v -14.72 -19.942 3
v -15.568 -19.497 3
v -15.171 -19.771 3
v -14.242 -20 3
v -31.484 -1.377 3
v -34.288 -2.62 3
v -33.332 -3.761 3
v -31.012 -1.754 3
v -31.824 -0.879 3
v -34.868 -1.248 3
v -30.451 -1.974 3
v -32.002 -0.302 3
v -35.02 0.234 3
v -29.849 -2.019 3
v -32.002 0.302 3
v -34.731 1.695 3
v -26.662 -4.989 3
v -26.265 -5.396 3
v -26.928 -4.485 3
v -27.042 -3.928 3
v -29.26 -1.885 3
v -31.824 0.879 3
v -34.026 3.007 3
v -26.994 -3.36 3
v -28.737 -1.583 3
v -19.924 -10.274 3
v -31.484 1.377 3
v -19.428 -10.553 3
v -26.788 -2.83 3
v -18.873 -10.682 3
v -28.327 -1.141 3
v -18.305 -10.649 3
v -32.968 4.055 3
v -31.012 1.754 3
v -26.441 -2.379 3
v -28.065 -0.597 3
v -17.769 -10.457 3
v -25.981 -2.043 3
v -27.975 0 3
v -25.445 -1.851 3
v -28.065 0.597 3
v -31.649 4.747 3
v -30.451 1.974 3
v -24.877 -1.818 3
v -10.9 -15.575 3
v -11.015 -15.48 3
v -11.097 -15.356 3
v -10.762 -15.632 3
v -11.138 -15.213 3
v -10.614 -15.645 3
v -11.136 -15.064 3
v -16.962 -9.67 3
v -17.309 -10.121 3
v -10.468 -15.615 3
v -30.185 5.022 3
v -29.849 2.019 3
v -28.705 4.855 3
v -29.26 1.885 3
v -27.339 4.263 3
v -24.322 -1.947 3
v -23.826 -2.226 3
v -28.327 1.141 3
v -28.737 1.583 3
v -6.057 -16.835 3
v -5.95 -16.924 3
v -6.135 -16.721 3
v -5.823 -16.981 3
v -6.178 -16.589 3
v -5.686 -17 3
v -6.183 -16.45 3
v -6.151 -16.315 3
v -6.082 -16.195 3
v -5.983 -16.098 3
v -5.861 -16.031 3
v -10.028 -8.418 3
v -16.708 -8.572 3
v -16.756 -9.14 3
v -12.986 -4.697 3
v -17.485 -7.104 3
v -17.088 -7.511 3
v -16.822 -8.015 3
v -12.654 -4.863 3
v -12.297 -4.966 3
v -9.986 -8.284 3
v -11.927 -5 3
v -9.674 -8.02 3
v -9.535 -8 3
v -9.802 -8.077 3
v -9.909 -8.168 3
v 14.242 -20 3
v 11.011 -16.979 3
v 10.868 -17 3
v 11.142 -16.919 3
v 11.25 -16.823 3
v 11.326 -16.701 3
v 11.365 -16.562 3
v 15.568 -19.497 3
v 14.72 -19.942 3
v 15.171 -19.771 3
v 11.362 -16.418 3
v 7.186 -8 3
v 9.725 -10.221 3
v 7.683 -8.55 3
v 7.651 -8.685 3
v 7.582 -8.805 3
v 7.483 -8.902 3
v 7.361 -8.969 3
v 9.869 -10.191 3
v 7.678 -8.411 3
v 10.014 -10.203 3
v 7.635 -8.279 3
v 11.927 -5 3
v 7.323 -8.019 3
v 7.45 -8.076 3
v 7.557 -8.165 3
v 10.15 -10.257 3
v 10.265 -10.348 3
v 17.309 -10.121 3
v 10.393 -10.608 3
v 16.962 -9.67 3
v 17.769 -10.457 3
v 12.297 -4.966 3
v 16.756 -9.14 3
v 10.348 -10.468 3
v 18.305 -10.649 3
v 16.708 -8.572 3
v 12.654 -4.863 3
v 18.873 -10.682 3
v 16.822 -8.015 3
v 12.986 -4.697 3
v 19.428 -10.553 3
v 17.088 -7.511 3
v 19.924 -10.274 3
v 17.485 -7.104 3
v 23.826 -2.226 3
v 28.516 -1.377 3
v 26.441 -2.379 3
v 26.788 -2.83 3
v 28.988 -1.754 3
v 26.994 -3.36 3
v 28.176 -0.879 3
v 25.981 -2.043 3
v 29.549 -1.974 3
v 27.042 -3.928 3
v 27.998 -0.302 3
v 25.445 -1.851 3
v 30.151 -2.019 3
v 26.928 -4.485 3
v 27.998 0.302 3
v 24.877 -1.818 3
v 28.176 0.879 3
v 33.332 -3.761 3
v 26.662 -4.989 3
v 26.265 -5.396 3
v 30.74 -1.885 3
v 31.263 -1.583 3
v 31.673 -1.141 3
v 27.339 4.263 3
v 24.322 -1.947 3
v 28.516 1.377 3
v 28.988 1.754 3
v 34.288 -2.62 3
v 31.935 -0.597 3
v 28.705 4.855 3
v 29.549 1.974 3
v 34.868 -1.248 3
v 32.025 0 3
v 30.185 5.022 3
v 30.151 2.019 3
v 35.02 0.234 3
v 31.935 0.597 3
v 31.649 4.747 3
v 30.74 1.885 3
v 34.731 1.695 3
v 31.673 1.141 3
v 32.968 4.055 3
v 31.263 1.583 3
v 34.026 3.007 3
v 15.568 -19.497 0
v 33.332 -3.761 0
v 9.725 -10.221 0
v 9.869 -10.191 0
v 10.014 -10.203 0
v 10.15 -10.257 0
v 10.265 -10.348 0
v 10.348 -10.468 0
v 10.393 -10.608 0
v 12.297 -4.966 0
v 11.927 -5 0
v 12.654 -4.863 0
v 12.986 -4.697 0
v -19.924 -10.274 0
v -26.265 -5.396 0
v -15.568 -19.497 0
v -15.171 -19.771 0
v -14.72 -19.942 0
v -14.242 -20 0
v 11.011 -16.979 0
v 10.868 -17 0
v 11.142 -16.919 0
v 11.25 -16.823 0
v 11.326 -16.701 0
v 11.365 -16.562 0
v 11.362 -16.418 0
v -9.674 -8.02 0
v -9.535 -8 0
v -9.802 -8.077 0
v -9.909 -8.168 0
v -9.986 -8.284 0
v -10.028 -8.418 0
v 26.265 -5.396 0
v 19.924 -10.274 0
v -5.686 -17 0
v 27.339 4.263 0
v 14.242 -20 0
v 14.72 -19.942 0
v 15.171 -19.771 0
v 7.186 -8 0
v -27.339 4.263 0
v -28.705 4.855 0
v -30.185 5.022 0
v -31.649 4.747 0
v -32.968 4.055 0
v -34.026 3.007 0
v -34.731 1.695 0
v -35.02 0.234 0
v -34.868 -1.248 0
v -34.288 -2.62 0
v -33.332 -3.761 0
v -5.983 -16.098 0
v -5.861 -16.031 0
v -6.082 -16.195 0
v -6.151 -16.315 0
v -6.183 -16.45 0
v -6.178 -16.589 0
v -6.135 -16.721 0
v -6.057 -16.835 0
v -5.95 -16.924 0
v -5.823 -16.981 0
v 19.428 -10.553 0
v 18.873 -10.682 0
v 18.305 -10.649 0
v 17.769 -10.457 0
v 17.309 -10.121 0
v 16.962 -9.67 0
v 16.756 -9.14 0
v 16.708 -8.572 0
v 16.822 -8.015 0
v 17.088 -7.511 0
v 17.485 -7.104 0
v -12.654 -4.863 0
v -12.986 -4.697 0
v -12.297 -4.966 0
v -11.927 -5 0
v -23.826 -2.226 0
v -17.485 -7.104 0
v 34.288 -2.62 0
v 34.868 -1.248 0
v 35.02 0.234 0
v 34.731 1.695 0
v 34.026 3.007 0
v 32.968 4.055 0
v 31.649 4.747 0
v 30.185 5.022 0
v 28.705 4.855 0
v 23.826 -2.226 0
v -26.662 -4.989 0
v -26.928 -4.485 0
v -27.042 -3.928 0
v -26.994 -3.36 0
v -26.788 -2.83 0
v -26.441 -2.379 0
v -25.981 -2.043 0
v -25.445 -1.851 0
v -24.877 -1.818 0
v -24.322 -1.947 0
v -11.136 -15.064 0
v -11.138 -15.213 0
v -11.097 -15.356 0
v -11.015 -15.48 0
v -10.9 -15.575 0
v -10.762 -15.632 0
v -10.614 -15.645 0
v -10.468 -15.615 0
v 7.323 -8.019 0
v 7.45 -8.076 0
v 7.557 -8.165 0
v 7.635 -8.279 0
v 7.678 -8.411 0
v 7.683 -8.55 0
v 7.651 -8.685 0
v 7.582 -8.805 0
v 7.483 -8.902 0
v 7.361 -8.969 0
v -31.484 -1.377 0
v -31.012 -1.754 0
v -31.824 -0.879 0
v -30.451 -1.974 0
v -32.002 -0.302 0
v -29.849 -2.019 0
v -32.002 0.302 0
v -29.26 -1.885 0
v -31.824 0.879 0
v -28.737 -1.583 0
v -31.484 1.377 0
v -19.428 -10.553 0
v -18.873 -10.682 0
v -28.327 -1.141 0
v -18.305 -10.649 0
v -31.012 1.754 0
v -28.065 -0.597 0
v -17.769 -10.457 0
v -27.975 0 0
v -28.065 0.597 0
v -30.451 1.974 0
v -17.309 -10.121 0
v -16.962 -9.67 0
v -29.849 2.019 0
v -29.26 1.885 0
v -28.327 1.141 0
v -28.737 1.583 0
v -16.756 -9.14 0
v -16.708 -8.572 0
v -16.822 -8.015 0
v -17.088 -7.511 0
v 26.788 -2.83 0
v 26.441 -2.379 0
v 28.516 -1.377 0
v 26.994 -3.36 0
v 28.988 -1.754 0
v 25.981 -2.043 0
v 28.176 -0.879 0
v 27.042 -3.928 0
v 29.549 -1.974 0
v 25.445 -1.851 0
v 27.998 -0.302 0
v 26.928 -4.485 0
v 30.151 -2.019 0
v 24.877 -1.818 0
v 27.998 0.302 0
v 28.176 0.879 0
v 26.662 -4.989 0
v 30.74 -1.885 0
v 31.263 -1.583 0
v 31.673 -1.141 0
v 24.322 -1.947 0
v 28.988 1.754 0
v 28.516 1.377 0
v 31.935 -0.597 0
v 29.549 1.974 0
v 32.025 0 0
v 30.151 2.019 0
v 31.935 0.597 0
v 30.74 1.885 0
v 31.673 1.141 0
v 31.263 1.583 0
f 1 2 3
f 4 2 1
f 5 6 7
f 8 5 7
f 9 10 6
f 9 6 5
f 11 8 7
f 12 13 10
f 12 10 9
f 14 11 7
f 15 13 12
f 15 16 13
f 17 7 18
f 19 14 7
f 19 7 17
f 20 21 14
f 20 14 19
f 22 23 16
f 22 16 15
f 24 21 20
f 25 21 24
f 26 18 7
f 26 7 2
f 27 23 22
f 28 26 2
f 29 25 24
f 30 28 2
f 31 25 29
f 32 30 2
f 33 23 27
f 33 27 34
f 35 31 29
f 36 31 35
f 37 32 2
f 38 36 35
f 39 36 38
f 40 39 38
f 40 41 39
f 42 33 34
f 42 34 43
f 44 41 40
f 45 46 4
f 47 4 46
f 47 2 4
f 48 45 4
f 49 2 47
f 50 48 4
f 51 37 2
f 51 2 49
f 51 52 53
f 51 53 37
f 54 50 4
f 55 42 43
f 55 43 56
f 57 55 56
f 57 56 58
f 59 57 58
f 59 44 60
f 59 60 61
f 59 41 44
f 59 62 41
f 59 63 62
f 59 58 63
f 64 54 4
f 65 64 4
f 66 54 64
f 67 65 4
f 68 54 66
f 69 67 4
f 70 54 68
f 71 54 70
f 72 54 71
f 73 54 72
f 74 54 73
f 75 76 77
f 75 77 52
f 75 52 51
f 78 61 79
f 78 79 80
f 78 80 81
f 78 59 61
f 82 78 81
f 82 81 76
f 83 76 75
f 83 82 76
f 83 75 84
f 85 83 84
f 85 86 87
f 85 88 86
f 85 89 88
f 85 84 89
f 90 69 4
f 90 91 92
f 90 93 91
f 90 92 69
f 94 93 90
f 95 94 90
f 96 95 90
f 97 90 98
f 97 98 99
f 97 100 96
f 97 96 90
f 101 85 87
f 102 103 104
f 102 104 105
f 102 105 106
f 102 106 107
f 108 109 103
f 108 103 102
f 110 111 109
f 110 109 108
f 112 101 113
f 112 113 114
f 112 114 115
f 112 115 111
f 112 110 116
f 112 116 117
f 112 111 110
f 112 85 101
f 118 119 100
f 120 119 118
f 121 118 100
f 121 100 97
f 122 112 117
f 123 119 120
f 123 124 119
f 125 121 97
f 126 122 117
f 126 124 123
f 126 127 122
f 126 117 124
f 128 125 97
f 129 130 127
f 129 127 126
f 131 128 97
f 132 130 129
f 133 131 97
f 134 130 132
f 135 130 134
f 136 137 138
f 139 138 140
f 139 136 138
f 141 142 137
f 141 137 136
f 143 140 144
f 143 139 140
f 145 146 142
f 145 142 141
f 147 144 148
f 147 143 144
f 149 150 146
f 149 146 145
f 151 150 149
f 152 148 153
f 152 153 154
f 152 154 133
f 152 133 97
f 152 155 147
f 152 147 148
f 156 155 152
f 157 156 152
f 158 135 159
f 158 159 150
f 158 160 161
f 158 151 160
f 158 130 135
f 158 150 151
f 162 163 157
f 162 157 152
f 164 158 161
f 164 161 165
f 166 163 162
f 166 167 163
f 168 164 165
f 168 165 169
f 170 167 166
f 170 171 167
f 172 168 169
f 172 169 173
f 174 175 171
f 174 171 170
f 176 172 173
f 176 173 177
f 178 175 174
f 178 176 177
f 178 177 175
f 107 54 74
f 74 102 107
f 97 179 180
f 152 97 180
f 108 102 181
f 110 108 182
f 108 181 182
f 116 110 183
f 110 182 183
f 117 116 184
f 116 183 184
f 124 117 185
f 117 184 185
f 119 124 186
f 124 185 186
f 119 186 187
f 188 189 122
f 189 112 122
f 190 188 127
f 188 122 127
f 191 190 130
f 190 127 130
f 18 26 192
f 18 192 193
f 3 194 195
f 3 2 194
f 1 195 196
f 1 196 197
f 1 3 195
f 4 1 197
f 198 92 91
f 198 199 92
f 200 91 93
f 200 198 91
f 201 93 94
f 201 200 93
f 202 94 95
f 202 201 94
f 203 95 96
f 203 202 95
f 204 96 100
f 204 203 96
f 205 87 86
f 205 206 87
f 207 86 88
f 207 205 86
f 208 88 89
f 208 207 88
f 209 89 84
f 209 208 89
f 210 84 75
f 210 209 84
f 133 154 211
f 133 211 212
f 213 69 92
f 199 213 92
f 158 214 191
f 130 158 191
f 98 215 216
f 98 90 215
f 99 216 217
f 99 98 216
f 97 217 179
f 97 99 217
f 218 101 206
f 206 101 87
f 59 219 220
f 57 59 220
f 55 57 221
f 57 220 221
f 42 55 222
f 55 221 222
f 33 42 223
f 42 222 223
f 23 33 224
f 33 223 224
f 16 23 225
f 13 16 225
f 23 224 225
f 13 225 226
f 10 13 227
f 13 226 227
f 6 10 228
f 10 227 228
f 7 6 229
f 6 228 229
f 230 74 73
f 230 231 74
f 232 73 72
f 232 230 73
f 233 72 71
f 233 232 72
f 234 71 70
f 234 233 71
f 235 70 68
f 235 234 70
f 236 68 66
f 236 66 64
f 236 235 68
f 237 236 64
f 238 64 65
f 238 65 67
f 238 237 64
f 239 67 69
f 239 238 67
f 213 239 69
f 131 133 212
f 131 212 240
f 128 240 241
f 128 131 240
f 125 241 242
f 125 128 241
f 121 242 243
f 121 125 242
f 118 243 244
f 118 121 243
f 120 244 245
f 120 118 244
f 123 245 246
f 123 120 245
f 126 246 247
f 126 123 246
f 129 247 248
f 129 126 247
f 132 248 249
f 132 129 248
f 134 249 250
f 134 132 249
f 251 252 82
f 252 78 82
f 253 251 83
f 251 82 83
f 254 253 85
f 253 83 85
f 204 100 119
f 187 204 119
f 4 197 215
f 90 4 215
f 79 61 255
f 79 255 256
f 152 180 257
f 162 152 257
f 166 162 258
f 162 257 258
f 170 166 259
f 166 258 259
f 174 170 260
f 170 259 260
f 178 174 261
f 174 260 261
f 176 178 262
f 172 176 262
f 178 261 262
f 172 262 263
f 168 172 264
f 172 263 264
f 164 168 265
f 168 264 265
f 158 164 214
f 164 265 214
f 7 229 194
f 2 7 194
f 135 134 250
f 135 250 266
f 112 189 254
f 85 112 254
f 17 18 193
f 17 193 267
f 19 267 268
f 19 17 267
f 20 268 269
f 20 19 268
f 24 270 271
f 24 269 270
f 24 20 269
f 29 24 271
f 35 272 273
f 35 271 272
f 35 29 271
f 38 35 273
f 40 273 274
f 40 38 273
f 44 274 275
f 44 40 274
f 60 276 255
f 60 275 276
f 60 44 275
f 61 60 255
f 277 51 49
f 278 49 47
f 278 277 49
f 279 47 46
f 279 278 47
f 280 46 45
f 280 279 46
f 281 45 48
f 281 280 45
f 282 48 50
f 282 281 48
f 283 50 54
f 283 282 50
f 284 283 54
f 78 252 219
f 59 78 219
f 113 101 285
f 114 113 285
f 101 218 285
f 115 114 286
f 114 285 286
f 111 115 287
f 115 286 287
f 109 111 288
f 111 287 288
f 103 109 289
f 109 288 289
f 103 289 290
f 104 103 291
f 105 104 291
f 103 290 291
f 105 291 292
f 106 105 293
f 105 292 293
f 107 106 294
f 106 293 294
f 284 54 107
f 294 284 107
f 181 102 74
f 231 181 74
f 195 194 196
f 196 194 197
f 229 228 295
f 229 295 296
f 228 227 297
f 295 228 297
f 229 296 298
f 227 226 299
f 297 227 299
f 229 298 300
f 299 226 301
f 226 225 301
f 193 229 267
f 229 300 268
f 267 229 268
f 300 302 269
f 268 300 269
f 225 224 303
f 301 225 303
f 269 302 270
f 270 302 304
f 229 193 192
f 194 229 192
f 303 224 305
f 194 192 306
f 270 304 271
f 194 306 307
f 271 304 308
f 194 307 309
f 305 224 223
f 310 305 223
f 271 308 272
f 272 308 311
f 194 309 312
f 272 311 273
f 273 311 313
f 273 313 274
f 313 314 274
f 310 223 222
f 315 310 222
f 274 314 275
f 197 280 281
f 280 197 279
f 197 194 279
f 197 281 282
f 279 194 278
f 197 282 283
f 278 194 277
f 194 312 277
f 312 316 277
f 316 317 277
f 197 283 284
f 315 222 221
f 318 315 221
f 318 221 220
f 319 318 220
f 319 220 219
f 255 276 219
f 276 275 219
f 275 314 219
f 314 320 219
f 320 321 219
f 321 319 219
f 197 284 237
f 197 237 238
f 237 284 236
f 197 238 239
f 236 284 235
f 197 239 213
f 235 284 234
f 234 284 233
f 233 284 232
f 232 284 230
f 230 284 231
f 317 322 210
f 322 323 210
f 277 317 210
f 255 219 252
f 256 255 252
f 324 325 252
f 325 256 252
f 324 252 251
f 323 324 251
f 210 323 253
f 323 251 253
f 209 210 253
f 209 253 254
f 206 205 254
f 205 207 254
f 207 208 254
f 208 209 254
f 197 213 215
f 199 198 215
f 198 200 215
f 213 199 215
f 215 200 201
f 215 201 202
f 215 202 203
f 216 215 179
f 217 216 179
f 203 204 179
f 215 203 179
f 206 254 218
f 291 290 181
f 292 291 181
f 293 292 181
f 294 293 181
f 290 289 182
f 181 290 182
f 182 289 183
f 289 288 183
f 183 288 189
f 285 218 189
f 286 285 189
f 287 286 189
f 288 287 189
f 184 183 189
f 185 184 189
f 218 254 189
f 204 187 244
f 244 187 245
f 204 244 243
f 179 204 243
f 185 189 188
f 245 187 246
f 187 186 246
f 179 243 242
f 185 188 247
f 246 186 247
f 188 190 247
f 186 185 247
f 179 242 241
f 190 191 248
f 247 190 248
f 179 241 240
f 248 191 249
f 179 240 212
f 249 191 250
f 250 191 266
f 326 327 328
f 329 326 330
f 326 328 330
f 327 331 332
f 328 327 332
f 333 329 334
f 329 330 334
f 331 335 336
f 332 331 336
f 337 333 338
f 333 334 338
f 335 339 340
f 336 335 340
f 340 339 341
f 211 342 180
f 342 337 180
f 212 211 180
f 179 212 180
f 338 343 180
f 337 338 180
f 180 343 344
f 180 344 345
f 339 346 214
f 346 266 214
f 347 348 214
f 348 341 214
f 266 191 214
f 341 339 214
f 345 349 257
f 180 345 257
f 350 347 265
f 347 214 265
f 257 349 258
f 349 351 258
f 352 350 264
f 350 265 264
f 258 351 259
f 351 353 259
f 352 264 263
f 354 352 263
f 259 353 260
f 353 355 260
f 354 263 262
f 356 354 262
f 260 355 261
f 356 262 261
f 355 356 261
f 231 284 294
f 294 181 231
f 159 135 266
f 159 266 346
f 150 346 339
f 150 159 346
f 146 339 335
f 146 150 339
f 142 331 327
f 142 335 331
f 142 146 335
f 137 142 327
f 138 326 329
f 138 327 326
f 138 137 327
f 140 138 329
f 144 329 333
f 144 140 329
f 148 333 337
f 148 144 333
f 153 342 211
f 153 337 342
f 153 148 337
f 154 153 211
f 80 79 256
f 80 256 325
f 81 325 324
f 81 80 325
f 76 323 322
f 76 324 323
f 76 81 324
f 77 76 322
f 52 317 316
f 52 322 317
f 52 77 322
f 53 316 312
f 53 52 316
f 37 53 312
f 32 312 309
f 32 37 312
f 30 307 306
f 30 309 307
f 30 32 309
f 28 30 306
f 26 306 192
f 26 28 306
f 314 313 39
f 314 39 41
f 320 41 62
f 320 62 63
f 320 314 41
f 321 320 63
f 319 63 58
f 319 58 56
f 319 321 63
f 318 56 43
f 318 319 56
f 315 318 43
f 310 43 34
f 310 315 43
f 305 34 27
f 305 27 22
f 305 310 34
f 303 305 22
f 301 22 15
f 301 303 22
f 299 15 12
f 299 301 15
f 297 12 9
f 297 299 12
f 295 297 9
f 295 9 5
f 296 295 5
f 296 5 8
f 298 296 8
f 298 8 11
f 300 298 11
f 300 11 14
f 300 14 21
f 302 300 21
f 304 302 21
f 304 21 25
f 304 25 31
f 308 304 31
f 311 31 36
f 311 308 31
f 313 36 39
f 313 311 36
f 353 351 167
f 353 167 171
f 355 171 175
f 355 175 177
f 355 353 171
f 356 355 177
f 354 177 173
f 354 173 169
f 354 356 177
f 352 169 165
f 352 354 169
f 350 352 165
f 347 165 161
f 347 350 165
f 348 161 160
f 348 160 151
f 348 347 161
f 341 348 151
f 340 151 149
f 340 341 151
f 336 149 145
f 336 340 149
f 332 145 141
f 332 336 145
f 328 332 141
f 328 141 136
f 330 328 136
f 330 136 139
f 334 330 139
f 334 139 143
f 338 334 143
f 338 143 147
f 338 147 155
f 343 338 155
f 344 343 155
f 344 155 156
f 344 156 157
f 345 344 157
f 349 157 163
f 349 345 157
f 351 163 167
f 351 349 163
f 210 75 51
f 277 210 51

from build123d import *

# Parameters (mm, degrees)
SKETCH_1_R          = 2.025
EXTRUDE_1_DEPTH     = 3
CUT_EXTRUDE_1_DEPTH = 13
FILLET_1_R          = 0.5
FILLET_2_R          = 2


with BuildPart() as part:
    # 草图1 → 凸台-拉伸1 (new body)
    with BuildSketch(Plane.XY):
        with BuildLine():
            Line((-12.5, -5), (-27.339189471, 4.262711851))
            ThreePointArc((-27.339189471, 4.262711851), (-34.026108353, 3.006838294), (-33.33194179, -3.761487592))
            Line((-33.33194179, -3.761487592), (-15, -20))
            Line((-15, -20), (15, -20))
            Line((15, -20), (33.33194179, -3.761487592))
            ThreePointArc((33.33194179, -3.761487592), (34.026108353, 3.006838294), (27.339189471, 4.262711851))
            Line((27.339189471, 4.262711851), (12.5, -5))
            Line((12.5, -5), (-12.5, -5))
        make_face()
        with Locations((-30, 0)):
            Circle(SKETCH_1_R, mode=Mode.SUBTRACT)
        with Locations((30, 0)):
            Circle(SKETCH_1_R, mode=Mode.SUBTRACT)
    extrude(amount=EXTRUDE_1_DEPTH)

    # 草图2 → 切除-拉伸1 (cut)
    with BuildSketch(Plane.XY.offset(3)):
        Polygon((9.958618735, -8), (-9.958618735, -8), (-11.278048465, -15.916578379), align=None)
        Polygon((10.293550357, -10.009589734), (-8.458618735, -17), (11.458618735, -17), align=None)
        with BuildLine():
            Line((17.485082522, -7.103595065), (23.826074435, -2.225908978))
            ThreePointArc((23.826074435, -2.225908978), (26.630743935, -2.591735435), (26.264917478, -5.396404935))
            Line((26.264917478, -5.396404935), (19.923925565, -10.274091022))
            ThreePointArc((19.923925565, -10.274091022), (17.119256065, -9.908264565), (17.485082522, -7.103595065))
        make_face()
        with BuildLine():
            Line((-23.826074435, -2.225908978), (-17.485082522, -7.103595065))
            ThreePointArc((-17.485082522, -7.103595065), (-17.119256065, -9.908264565), (-19.923925565, -10.274091022))
            Line((-19.923925565, -10.274091022), (-26.264917478, -5.396404935))
            ThreePointArc((-26.264917478, -5.396404935), (-26.630743935, -2.591735435), (-23.826074435, -2.225908978))
        make_face()
    extrude(amount=-CUT_EXTRUDE_1_DEPTH, mode=Mode.SUBTRACT)

    # 圆角1
    fillet_1_edges = [part.edges().sort_by_distance(p)[0] for p in [
        (11.458618735, -17, 1.5),
        (-8.458618735, -17, 1.5),
        (10.293550357, -10.009589734, 1.5),
        (-11.278048465, -15.916578379, 1.5),
        (-9.958618735, -8, 1.5),
        (9.958618735, -8, 1.5),
    ]]
    fillet(fillet_1_edges, radius=FILLET_1_R)

    # 圆角2
    fillet_2_edges = [part.edges().sort_by_distance(p)[0] for p in [
        (-12.5, -5, 1.5),
        (12.5, -5, 1.5),
        (15, -20, 1.5),
        (-15, -20, 1.5),
    ]]
    fillet(fillet_2_edges, radius=FILLET_2_R)


solid = part.part
